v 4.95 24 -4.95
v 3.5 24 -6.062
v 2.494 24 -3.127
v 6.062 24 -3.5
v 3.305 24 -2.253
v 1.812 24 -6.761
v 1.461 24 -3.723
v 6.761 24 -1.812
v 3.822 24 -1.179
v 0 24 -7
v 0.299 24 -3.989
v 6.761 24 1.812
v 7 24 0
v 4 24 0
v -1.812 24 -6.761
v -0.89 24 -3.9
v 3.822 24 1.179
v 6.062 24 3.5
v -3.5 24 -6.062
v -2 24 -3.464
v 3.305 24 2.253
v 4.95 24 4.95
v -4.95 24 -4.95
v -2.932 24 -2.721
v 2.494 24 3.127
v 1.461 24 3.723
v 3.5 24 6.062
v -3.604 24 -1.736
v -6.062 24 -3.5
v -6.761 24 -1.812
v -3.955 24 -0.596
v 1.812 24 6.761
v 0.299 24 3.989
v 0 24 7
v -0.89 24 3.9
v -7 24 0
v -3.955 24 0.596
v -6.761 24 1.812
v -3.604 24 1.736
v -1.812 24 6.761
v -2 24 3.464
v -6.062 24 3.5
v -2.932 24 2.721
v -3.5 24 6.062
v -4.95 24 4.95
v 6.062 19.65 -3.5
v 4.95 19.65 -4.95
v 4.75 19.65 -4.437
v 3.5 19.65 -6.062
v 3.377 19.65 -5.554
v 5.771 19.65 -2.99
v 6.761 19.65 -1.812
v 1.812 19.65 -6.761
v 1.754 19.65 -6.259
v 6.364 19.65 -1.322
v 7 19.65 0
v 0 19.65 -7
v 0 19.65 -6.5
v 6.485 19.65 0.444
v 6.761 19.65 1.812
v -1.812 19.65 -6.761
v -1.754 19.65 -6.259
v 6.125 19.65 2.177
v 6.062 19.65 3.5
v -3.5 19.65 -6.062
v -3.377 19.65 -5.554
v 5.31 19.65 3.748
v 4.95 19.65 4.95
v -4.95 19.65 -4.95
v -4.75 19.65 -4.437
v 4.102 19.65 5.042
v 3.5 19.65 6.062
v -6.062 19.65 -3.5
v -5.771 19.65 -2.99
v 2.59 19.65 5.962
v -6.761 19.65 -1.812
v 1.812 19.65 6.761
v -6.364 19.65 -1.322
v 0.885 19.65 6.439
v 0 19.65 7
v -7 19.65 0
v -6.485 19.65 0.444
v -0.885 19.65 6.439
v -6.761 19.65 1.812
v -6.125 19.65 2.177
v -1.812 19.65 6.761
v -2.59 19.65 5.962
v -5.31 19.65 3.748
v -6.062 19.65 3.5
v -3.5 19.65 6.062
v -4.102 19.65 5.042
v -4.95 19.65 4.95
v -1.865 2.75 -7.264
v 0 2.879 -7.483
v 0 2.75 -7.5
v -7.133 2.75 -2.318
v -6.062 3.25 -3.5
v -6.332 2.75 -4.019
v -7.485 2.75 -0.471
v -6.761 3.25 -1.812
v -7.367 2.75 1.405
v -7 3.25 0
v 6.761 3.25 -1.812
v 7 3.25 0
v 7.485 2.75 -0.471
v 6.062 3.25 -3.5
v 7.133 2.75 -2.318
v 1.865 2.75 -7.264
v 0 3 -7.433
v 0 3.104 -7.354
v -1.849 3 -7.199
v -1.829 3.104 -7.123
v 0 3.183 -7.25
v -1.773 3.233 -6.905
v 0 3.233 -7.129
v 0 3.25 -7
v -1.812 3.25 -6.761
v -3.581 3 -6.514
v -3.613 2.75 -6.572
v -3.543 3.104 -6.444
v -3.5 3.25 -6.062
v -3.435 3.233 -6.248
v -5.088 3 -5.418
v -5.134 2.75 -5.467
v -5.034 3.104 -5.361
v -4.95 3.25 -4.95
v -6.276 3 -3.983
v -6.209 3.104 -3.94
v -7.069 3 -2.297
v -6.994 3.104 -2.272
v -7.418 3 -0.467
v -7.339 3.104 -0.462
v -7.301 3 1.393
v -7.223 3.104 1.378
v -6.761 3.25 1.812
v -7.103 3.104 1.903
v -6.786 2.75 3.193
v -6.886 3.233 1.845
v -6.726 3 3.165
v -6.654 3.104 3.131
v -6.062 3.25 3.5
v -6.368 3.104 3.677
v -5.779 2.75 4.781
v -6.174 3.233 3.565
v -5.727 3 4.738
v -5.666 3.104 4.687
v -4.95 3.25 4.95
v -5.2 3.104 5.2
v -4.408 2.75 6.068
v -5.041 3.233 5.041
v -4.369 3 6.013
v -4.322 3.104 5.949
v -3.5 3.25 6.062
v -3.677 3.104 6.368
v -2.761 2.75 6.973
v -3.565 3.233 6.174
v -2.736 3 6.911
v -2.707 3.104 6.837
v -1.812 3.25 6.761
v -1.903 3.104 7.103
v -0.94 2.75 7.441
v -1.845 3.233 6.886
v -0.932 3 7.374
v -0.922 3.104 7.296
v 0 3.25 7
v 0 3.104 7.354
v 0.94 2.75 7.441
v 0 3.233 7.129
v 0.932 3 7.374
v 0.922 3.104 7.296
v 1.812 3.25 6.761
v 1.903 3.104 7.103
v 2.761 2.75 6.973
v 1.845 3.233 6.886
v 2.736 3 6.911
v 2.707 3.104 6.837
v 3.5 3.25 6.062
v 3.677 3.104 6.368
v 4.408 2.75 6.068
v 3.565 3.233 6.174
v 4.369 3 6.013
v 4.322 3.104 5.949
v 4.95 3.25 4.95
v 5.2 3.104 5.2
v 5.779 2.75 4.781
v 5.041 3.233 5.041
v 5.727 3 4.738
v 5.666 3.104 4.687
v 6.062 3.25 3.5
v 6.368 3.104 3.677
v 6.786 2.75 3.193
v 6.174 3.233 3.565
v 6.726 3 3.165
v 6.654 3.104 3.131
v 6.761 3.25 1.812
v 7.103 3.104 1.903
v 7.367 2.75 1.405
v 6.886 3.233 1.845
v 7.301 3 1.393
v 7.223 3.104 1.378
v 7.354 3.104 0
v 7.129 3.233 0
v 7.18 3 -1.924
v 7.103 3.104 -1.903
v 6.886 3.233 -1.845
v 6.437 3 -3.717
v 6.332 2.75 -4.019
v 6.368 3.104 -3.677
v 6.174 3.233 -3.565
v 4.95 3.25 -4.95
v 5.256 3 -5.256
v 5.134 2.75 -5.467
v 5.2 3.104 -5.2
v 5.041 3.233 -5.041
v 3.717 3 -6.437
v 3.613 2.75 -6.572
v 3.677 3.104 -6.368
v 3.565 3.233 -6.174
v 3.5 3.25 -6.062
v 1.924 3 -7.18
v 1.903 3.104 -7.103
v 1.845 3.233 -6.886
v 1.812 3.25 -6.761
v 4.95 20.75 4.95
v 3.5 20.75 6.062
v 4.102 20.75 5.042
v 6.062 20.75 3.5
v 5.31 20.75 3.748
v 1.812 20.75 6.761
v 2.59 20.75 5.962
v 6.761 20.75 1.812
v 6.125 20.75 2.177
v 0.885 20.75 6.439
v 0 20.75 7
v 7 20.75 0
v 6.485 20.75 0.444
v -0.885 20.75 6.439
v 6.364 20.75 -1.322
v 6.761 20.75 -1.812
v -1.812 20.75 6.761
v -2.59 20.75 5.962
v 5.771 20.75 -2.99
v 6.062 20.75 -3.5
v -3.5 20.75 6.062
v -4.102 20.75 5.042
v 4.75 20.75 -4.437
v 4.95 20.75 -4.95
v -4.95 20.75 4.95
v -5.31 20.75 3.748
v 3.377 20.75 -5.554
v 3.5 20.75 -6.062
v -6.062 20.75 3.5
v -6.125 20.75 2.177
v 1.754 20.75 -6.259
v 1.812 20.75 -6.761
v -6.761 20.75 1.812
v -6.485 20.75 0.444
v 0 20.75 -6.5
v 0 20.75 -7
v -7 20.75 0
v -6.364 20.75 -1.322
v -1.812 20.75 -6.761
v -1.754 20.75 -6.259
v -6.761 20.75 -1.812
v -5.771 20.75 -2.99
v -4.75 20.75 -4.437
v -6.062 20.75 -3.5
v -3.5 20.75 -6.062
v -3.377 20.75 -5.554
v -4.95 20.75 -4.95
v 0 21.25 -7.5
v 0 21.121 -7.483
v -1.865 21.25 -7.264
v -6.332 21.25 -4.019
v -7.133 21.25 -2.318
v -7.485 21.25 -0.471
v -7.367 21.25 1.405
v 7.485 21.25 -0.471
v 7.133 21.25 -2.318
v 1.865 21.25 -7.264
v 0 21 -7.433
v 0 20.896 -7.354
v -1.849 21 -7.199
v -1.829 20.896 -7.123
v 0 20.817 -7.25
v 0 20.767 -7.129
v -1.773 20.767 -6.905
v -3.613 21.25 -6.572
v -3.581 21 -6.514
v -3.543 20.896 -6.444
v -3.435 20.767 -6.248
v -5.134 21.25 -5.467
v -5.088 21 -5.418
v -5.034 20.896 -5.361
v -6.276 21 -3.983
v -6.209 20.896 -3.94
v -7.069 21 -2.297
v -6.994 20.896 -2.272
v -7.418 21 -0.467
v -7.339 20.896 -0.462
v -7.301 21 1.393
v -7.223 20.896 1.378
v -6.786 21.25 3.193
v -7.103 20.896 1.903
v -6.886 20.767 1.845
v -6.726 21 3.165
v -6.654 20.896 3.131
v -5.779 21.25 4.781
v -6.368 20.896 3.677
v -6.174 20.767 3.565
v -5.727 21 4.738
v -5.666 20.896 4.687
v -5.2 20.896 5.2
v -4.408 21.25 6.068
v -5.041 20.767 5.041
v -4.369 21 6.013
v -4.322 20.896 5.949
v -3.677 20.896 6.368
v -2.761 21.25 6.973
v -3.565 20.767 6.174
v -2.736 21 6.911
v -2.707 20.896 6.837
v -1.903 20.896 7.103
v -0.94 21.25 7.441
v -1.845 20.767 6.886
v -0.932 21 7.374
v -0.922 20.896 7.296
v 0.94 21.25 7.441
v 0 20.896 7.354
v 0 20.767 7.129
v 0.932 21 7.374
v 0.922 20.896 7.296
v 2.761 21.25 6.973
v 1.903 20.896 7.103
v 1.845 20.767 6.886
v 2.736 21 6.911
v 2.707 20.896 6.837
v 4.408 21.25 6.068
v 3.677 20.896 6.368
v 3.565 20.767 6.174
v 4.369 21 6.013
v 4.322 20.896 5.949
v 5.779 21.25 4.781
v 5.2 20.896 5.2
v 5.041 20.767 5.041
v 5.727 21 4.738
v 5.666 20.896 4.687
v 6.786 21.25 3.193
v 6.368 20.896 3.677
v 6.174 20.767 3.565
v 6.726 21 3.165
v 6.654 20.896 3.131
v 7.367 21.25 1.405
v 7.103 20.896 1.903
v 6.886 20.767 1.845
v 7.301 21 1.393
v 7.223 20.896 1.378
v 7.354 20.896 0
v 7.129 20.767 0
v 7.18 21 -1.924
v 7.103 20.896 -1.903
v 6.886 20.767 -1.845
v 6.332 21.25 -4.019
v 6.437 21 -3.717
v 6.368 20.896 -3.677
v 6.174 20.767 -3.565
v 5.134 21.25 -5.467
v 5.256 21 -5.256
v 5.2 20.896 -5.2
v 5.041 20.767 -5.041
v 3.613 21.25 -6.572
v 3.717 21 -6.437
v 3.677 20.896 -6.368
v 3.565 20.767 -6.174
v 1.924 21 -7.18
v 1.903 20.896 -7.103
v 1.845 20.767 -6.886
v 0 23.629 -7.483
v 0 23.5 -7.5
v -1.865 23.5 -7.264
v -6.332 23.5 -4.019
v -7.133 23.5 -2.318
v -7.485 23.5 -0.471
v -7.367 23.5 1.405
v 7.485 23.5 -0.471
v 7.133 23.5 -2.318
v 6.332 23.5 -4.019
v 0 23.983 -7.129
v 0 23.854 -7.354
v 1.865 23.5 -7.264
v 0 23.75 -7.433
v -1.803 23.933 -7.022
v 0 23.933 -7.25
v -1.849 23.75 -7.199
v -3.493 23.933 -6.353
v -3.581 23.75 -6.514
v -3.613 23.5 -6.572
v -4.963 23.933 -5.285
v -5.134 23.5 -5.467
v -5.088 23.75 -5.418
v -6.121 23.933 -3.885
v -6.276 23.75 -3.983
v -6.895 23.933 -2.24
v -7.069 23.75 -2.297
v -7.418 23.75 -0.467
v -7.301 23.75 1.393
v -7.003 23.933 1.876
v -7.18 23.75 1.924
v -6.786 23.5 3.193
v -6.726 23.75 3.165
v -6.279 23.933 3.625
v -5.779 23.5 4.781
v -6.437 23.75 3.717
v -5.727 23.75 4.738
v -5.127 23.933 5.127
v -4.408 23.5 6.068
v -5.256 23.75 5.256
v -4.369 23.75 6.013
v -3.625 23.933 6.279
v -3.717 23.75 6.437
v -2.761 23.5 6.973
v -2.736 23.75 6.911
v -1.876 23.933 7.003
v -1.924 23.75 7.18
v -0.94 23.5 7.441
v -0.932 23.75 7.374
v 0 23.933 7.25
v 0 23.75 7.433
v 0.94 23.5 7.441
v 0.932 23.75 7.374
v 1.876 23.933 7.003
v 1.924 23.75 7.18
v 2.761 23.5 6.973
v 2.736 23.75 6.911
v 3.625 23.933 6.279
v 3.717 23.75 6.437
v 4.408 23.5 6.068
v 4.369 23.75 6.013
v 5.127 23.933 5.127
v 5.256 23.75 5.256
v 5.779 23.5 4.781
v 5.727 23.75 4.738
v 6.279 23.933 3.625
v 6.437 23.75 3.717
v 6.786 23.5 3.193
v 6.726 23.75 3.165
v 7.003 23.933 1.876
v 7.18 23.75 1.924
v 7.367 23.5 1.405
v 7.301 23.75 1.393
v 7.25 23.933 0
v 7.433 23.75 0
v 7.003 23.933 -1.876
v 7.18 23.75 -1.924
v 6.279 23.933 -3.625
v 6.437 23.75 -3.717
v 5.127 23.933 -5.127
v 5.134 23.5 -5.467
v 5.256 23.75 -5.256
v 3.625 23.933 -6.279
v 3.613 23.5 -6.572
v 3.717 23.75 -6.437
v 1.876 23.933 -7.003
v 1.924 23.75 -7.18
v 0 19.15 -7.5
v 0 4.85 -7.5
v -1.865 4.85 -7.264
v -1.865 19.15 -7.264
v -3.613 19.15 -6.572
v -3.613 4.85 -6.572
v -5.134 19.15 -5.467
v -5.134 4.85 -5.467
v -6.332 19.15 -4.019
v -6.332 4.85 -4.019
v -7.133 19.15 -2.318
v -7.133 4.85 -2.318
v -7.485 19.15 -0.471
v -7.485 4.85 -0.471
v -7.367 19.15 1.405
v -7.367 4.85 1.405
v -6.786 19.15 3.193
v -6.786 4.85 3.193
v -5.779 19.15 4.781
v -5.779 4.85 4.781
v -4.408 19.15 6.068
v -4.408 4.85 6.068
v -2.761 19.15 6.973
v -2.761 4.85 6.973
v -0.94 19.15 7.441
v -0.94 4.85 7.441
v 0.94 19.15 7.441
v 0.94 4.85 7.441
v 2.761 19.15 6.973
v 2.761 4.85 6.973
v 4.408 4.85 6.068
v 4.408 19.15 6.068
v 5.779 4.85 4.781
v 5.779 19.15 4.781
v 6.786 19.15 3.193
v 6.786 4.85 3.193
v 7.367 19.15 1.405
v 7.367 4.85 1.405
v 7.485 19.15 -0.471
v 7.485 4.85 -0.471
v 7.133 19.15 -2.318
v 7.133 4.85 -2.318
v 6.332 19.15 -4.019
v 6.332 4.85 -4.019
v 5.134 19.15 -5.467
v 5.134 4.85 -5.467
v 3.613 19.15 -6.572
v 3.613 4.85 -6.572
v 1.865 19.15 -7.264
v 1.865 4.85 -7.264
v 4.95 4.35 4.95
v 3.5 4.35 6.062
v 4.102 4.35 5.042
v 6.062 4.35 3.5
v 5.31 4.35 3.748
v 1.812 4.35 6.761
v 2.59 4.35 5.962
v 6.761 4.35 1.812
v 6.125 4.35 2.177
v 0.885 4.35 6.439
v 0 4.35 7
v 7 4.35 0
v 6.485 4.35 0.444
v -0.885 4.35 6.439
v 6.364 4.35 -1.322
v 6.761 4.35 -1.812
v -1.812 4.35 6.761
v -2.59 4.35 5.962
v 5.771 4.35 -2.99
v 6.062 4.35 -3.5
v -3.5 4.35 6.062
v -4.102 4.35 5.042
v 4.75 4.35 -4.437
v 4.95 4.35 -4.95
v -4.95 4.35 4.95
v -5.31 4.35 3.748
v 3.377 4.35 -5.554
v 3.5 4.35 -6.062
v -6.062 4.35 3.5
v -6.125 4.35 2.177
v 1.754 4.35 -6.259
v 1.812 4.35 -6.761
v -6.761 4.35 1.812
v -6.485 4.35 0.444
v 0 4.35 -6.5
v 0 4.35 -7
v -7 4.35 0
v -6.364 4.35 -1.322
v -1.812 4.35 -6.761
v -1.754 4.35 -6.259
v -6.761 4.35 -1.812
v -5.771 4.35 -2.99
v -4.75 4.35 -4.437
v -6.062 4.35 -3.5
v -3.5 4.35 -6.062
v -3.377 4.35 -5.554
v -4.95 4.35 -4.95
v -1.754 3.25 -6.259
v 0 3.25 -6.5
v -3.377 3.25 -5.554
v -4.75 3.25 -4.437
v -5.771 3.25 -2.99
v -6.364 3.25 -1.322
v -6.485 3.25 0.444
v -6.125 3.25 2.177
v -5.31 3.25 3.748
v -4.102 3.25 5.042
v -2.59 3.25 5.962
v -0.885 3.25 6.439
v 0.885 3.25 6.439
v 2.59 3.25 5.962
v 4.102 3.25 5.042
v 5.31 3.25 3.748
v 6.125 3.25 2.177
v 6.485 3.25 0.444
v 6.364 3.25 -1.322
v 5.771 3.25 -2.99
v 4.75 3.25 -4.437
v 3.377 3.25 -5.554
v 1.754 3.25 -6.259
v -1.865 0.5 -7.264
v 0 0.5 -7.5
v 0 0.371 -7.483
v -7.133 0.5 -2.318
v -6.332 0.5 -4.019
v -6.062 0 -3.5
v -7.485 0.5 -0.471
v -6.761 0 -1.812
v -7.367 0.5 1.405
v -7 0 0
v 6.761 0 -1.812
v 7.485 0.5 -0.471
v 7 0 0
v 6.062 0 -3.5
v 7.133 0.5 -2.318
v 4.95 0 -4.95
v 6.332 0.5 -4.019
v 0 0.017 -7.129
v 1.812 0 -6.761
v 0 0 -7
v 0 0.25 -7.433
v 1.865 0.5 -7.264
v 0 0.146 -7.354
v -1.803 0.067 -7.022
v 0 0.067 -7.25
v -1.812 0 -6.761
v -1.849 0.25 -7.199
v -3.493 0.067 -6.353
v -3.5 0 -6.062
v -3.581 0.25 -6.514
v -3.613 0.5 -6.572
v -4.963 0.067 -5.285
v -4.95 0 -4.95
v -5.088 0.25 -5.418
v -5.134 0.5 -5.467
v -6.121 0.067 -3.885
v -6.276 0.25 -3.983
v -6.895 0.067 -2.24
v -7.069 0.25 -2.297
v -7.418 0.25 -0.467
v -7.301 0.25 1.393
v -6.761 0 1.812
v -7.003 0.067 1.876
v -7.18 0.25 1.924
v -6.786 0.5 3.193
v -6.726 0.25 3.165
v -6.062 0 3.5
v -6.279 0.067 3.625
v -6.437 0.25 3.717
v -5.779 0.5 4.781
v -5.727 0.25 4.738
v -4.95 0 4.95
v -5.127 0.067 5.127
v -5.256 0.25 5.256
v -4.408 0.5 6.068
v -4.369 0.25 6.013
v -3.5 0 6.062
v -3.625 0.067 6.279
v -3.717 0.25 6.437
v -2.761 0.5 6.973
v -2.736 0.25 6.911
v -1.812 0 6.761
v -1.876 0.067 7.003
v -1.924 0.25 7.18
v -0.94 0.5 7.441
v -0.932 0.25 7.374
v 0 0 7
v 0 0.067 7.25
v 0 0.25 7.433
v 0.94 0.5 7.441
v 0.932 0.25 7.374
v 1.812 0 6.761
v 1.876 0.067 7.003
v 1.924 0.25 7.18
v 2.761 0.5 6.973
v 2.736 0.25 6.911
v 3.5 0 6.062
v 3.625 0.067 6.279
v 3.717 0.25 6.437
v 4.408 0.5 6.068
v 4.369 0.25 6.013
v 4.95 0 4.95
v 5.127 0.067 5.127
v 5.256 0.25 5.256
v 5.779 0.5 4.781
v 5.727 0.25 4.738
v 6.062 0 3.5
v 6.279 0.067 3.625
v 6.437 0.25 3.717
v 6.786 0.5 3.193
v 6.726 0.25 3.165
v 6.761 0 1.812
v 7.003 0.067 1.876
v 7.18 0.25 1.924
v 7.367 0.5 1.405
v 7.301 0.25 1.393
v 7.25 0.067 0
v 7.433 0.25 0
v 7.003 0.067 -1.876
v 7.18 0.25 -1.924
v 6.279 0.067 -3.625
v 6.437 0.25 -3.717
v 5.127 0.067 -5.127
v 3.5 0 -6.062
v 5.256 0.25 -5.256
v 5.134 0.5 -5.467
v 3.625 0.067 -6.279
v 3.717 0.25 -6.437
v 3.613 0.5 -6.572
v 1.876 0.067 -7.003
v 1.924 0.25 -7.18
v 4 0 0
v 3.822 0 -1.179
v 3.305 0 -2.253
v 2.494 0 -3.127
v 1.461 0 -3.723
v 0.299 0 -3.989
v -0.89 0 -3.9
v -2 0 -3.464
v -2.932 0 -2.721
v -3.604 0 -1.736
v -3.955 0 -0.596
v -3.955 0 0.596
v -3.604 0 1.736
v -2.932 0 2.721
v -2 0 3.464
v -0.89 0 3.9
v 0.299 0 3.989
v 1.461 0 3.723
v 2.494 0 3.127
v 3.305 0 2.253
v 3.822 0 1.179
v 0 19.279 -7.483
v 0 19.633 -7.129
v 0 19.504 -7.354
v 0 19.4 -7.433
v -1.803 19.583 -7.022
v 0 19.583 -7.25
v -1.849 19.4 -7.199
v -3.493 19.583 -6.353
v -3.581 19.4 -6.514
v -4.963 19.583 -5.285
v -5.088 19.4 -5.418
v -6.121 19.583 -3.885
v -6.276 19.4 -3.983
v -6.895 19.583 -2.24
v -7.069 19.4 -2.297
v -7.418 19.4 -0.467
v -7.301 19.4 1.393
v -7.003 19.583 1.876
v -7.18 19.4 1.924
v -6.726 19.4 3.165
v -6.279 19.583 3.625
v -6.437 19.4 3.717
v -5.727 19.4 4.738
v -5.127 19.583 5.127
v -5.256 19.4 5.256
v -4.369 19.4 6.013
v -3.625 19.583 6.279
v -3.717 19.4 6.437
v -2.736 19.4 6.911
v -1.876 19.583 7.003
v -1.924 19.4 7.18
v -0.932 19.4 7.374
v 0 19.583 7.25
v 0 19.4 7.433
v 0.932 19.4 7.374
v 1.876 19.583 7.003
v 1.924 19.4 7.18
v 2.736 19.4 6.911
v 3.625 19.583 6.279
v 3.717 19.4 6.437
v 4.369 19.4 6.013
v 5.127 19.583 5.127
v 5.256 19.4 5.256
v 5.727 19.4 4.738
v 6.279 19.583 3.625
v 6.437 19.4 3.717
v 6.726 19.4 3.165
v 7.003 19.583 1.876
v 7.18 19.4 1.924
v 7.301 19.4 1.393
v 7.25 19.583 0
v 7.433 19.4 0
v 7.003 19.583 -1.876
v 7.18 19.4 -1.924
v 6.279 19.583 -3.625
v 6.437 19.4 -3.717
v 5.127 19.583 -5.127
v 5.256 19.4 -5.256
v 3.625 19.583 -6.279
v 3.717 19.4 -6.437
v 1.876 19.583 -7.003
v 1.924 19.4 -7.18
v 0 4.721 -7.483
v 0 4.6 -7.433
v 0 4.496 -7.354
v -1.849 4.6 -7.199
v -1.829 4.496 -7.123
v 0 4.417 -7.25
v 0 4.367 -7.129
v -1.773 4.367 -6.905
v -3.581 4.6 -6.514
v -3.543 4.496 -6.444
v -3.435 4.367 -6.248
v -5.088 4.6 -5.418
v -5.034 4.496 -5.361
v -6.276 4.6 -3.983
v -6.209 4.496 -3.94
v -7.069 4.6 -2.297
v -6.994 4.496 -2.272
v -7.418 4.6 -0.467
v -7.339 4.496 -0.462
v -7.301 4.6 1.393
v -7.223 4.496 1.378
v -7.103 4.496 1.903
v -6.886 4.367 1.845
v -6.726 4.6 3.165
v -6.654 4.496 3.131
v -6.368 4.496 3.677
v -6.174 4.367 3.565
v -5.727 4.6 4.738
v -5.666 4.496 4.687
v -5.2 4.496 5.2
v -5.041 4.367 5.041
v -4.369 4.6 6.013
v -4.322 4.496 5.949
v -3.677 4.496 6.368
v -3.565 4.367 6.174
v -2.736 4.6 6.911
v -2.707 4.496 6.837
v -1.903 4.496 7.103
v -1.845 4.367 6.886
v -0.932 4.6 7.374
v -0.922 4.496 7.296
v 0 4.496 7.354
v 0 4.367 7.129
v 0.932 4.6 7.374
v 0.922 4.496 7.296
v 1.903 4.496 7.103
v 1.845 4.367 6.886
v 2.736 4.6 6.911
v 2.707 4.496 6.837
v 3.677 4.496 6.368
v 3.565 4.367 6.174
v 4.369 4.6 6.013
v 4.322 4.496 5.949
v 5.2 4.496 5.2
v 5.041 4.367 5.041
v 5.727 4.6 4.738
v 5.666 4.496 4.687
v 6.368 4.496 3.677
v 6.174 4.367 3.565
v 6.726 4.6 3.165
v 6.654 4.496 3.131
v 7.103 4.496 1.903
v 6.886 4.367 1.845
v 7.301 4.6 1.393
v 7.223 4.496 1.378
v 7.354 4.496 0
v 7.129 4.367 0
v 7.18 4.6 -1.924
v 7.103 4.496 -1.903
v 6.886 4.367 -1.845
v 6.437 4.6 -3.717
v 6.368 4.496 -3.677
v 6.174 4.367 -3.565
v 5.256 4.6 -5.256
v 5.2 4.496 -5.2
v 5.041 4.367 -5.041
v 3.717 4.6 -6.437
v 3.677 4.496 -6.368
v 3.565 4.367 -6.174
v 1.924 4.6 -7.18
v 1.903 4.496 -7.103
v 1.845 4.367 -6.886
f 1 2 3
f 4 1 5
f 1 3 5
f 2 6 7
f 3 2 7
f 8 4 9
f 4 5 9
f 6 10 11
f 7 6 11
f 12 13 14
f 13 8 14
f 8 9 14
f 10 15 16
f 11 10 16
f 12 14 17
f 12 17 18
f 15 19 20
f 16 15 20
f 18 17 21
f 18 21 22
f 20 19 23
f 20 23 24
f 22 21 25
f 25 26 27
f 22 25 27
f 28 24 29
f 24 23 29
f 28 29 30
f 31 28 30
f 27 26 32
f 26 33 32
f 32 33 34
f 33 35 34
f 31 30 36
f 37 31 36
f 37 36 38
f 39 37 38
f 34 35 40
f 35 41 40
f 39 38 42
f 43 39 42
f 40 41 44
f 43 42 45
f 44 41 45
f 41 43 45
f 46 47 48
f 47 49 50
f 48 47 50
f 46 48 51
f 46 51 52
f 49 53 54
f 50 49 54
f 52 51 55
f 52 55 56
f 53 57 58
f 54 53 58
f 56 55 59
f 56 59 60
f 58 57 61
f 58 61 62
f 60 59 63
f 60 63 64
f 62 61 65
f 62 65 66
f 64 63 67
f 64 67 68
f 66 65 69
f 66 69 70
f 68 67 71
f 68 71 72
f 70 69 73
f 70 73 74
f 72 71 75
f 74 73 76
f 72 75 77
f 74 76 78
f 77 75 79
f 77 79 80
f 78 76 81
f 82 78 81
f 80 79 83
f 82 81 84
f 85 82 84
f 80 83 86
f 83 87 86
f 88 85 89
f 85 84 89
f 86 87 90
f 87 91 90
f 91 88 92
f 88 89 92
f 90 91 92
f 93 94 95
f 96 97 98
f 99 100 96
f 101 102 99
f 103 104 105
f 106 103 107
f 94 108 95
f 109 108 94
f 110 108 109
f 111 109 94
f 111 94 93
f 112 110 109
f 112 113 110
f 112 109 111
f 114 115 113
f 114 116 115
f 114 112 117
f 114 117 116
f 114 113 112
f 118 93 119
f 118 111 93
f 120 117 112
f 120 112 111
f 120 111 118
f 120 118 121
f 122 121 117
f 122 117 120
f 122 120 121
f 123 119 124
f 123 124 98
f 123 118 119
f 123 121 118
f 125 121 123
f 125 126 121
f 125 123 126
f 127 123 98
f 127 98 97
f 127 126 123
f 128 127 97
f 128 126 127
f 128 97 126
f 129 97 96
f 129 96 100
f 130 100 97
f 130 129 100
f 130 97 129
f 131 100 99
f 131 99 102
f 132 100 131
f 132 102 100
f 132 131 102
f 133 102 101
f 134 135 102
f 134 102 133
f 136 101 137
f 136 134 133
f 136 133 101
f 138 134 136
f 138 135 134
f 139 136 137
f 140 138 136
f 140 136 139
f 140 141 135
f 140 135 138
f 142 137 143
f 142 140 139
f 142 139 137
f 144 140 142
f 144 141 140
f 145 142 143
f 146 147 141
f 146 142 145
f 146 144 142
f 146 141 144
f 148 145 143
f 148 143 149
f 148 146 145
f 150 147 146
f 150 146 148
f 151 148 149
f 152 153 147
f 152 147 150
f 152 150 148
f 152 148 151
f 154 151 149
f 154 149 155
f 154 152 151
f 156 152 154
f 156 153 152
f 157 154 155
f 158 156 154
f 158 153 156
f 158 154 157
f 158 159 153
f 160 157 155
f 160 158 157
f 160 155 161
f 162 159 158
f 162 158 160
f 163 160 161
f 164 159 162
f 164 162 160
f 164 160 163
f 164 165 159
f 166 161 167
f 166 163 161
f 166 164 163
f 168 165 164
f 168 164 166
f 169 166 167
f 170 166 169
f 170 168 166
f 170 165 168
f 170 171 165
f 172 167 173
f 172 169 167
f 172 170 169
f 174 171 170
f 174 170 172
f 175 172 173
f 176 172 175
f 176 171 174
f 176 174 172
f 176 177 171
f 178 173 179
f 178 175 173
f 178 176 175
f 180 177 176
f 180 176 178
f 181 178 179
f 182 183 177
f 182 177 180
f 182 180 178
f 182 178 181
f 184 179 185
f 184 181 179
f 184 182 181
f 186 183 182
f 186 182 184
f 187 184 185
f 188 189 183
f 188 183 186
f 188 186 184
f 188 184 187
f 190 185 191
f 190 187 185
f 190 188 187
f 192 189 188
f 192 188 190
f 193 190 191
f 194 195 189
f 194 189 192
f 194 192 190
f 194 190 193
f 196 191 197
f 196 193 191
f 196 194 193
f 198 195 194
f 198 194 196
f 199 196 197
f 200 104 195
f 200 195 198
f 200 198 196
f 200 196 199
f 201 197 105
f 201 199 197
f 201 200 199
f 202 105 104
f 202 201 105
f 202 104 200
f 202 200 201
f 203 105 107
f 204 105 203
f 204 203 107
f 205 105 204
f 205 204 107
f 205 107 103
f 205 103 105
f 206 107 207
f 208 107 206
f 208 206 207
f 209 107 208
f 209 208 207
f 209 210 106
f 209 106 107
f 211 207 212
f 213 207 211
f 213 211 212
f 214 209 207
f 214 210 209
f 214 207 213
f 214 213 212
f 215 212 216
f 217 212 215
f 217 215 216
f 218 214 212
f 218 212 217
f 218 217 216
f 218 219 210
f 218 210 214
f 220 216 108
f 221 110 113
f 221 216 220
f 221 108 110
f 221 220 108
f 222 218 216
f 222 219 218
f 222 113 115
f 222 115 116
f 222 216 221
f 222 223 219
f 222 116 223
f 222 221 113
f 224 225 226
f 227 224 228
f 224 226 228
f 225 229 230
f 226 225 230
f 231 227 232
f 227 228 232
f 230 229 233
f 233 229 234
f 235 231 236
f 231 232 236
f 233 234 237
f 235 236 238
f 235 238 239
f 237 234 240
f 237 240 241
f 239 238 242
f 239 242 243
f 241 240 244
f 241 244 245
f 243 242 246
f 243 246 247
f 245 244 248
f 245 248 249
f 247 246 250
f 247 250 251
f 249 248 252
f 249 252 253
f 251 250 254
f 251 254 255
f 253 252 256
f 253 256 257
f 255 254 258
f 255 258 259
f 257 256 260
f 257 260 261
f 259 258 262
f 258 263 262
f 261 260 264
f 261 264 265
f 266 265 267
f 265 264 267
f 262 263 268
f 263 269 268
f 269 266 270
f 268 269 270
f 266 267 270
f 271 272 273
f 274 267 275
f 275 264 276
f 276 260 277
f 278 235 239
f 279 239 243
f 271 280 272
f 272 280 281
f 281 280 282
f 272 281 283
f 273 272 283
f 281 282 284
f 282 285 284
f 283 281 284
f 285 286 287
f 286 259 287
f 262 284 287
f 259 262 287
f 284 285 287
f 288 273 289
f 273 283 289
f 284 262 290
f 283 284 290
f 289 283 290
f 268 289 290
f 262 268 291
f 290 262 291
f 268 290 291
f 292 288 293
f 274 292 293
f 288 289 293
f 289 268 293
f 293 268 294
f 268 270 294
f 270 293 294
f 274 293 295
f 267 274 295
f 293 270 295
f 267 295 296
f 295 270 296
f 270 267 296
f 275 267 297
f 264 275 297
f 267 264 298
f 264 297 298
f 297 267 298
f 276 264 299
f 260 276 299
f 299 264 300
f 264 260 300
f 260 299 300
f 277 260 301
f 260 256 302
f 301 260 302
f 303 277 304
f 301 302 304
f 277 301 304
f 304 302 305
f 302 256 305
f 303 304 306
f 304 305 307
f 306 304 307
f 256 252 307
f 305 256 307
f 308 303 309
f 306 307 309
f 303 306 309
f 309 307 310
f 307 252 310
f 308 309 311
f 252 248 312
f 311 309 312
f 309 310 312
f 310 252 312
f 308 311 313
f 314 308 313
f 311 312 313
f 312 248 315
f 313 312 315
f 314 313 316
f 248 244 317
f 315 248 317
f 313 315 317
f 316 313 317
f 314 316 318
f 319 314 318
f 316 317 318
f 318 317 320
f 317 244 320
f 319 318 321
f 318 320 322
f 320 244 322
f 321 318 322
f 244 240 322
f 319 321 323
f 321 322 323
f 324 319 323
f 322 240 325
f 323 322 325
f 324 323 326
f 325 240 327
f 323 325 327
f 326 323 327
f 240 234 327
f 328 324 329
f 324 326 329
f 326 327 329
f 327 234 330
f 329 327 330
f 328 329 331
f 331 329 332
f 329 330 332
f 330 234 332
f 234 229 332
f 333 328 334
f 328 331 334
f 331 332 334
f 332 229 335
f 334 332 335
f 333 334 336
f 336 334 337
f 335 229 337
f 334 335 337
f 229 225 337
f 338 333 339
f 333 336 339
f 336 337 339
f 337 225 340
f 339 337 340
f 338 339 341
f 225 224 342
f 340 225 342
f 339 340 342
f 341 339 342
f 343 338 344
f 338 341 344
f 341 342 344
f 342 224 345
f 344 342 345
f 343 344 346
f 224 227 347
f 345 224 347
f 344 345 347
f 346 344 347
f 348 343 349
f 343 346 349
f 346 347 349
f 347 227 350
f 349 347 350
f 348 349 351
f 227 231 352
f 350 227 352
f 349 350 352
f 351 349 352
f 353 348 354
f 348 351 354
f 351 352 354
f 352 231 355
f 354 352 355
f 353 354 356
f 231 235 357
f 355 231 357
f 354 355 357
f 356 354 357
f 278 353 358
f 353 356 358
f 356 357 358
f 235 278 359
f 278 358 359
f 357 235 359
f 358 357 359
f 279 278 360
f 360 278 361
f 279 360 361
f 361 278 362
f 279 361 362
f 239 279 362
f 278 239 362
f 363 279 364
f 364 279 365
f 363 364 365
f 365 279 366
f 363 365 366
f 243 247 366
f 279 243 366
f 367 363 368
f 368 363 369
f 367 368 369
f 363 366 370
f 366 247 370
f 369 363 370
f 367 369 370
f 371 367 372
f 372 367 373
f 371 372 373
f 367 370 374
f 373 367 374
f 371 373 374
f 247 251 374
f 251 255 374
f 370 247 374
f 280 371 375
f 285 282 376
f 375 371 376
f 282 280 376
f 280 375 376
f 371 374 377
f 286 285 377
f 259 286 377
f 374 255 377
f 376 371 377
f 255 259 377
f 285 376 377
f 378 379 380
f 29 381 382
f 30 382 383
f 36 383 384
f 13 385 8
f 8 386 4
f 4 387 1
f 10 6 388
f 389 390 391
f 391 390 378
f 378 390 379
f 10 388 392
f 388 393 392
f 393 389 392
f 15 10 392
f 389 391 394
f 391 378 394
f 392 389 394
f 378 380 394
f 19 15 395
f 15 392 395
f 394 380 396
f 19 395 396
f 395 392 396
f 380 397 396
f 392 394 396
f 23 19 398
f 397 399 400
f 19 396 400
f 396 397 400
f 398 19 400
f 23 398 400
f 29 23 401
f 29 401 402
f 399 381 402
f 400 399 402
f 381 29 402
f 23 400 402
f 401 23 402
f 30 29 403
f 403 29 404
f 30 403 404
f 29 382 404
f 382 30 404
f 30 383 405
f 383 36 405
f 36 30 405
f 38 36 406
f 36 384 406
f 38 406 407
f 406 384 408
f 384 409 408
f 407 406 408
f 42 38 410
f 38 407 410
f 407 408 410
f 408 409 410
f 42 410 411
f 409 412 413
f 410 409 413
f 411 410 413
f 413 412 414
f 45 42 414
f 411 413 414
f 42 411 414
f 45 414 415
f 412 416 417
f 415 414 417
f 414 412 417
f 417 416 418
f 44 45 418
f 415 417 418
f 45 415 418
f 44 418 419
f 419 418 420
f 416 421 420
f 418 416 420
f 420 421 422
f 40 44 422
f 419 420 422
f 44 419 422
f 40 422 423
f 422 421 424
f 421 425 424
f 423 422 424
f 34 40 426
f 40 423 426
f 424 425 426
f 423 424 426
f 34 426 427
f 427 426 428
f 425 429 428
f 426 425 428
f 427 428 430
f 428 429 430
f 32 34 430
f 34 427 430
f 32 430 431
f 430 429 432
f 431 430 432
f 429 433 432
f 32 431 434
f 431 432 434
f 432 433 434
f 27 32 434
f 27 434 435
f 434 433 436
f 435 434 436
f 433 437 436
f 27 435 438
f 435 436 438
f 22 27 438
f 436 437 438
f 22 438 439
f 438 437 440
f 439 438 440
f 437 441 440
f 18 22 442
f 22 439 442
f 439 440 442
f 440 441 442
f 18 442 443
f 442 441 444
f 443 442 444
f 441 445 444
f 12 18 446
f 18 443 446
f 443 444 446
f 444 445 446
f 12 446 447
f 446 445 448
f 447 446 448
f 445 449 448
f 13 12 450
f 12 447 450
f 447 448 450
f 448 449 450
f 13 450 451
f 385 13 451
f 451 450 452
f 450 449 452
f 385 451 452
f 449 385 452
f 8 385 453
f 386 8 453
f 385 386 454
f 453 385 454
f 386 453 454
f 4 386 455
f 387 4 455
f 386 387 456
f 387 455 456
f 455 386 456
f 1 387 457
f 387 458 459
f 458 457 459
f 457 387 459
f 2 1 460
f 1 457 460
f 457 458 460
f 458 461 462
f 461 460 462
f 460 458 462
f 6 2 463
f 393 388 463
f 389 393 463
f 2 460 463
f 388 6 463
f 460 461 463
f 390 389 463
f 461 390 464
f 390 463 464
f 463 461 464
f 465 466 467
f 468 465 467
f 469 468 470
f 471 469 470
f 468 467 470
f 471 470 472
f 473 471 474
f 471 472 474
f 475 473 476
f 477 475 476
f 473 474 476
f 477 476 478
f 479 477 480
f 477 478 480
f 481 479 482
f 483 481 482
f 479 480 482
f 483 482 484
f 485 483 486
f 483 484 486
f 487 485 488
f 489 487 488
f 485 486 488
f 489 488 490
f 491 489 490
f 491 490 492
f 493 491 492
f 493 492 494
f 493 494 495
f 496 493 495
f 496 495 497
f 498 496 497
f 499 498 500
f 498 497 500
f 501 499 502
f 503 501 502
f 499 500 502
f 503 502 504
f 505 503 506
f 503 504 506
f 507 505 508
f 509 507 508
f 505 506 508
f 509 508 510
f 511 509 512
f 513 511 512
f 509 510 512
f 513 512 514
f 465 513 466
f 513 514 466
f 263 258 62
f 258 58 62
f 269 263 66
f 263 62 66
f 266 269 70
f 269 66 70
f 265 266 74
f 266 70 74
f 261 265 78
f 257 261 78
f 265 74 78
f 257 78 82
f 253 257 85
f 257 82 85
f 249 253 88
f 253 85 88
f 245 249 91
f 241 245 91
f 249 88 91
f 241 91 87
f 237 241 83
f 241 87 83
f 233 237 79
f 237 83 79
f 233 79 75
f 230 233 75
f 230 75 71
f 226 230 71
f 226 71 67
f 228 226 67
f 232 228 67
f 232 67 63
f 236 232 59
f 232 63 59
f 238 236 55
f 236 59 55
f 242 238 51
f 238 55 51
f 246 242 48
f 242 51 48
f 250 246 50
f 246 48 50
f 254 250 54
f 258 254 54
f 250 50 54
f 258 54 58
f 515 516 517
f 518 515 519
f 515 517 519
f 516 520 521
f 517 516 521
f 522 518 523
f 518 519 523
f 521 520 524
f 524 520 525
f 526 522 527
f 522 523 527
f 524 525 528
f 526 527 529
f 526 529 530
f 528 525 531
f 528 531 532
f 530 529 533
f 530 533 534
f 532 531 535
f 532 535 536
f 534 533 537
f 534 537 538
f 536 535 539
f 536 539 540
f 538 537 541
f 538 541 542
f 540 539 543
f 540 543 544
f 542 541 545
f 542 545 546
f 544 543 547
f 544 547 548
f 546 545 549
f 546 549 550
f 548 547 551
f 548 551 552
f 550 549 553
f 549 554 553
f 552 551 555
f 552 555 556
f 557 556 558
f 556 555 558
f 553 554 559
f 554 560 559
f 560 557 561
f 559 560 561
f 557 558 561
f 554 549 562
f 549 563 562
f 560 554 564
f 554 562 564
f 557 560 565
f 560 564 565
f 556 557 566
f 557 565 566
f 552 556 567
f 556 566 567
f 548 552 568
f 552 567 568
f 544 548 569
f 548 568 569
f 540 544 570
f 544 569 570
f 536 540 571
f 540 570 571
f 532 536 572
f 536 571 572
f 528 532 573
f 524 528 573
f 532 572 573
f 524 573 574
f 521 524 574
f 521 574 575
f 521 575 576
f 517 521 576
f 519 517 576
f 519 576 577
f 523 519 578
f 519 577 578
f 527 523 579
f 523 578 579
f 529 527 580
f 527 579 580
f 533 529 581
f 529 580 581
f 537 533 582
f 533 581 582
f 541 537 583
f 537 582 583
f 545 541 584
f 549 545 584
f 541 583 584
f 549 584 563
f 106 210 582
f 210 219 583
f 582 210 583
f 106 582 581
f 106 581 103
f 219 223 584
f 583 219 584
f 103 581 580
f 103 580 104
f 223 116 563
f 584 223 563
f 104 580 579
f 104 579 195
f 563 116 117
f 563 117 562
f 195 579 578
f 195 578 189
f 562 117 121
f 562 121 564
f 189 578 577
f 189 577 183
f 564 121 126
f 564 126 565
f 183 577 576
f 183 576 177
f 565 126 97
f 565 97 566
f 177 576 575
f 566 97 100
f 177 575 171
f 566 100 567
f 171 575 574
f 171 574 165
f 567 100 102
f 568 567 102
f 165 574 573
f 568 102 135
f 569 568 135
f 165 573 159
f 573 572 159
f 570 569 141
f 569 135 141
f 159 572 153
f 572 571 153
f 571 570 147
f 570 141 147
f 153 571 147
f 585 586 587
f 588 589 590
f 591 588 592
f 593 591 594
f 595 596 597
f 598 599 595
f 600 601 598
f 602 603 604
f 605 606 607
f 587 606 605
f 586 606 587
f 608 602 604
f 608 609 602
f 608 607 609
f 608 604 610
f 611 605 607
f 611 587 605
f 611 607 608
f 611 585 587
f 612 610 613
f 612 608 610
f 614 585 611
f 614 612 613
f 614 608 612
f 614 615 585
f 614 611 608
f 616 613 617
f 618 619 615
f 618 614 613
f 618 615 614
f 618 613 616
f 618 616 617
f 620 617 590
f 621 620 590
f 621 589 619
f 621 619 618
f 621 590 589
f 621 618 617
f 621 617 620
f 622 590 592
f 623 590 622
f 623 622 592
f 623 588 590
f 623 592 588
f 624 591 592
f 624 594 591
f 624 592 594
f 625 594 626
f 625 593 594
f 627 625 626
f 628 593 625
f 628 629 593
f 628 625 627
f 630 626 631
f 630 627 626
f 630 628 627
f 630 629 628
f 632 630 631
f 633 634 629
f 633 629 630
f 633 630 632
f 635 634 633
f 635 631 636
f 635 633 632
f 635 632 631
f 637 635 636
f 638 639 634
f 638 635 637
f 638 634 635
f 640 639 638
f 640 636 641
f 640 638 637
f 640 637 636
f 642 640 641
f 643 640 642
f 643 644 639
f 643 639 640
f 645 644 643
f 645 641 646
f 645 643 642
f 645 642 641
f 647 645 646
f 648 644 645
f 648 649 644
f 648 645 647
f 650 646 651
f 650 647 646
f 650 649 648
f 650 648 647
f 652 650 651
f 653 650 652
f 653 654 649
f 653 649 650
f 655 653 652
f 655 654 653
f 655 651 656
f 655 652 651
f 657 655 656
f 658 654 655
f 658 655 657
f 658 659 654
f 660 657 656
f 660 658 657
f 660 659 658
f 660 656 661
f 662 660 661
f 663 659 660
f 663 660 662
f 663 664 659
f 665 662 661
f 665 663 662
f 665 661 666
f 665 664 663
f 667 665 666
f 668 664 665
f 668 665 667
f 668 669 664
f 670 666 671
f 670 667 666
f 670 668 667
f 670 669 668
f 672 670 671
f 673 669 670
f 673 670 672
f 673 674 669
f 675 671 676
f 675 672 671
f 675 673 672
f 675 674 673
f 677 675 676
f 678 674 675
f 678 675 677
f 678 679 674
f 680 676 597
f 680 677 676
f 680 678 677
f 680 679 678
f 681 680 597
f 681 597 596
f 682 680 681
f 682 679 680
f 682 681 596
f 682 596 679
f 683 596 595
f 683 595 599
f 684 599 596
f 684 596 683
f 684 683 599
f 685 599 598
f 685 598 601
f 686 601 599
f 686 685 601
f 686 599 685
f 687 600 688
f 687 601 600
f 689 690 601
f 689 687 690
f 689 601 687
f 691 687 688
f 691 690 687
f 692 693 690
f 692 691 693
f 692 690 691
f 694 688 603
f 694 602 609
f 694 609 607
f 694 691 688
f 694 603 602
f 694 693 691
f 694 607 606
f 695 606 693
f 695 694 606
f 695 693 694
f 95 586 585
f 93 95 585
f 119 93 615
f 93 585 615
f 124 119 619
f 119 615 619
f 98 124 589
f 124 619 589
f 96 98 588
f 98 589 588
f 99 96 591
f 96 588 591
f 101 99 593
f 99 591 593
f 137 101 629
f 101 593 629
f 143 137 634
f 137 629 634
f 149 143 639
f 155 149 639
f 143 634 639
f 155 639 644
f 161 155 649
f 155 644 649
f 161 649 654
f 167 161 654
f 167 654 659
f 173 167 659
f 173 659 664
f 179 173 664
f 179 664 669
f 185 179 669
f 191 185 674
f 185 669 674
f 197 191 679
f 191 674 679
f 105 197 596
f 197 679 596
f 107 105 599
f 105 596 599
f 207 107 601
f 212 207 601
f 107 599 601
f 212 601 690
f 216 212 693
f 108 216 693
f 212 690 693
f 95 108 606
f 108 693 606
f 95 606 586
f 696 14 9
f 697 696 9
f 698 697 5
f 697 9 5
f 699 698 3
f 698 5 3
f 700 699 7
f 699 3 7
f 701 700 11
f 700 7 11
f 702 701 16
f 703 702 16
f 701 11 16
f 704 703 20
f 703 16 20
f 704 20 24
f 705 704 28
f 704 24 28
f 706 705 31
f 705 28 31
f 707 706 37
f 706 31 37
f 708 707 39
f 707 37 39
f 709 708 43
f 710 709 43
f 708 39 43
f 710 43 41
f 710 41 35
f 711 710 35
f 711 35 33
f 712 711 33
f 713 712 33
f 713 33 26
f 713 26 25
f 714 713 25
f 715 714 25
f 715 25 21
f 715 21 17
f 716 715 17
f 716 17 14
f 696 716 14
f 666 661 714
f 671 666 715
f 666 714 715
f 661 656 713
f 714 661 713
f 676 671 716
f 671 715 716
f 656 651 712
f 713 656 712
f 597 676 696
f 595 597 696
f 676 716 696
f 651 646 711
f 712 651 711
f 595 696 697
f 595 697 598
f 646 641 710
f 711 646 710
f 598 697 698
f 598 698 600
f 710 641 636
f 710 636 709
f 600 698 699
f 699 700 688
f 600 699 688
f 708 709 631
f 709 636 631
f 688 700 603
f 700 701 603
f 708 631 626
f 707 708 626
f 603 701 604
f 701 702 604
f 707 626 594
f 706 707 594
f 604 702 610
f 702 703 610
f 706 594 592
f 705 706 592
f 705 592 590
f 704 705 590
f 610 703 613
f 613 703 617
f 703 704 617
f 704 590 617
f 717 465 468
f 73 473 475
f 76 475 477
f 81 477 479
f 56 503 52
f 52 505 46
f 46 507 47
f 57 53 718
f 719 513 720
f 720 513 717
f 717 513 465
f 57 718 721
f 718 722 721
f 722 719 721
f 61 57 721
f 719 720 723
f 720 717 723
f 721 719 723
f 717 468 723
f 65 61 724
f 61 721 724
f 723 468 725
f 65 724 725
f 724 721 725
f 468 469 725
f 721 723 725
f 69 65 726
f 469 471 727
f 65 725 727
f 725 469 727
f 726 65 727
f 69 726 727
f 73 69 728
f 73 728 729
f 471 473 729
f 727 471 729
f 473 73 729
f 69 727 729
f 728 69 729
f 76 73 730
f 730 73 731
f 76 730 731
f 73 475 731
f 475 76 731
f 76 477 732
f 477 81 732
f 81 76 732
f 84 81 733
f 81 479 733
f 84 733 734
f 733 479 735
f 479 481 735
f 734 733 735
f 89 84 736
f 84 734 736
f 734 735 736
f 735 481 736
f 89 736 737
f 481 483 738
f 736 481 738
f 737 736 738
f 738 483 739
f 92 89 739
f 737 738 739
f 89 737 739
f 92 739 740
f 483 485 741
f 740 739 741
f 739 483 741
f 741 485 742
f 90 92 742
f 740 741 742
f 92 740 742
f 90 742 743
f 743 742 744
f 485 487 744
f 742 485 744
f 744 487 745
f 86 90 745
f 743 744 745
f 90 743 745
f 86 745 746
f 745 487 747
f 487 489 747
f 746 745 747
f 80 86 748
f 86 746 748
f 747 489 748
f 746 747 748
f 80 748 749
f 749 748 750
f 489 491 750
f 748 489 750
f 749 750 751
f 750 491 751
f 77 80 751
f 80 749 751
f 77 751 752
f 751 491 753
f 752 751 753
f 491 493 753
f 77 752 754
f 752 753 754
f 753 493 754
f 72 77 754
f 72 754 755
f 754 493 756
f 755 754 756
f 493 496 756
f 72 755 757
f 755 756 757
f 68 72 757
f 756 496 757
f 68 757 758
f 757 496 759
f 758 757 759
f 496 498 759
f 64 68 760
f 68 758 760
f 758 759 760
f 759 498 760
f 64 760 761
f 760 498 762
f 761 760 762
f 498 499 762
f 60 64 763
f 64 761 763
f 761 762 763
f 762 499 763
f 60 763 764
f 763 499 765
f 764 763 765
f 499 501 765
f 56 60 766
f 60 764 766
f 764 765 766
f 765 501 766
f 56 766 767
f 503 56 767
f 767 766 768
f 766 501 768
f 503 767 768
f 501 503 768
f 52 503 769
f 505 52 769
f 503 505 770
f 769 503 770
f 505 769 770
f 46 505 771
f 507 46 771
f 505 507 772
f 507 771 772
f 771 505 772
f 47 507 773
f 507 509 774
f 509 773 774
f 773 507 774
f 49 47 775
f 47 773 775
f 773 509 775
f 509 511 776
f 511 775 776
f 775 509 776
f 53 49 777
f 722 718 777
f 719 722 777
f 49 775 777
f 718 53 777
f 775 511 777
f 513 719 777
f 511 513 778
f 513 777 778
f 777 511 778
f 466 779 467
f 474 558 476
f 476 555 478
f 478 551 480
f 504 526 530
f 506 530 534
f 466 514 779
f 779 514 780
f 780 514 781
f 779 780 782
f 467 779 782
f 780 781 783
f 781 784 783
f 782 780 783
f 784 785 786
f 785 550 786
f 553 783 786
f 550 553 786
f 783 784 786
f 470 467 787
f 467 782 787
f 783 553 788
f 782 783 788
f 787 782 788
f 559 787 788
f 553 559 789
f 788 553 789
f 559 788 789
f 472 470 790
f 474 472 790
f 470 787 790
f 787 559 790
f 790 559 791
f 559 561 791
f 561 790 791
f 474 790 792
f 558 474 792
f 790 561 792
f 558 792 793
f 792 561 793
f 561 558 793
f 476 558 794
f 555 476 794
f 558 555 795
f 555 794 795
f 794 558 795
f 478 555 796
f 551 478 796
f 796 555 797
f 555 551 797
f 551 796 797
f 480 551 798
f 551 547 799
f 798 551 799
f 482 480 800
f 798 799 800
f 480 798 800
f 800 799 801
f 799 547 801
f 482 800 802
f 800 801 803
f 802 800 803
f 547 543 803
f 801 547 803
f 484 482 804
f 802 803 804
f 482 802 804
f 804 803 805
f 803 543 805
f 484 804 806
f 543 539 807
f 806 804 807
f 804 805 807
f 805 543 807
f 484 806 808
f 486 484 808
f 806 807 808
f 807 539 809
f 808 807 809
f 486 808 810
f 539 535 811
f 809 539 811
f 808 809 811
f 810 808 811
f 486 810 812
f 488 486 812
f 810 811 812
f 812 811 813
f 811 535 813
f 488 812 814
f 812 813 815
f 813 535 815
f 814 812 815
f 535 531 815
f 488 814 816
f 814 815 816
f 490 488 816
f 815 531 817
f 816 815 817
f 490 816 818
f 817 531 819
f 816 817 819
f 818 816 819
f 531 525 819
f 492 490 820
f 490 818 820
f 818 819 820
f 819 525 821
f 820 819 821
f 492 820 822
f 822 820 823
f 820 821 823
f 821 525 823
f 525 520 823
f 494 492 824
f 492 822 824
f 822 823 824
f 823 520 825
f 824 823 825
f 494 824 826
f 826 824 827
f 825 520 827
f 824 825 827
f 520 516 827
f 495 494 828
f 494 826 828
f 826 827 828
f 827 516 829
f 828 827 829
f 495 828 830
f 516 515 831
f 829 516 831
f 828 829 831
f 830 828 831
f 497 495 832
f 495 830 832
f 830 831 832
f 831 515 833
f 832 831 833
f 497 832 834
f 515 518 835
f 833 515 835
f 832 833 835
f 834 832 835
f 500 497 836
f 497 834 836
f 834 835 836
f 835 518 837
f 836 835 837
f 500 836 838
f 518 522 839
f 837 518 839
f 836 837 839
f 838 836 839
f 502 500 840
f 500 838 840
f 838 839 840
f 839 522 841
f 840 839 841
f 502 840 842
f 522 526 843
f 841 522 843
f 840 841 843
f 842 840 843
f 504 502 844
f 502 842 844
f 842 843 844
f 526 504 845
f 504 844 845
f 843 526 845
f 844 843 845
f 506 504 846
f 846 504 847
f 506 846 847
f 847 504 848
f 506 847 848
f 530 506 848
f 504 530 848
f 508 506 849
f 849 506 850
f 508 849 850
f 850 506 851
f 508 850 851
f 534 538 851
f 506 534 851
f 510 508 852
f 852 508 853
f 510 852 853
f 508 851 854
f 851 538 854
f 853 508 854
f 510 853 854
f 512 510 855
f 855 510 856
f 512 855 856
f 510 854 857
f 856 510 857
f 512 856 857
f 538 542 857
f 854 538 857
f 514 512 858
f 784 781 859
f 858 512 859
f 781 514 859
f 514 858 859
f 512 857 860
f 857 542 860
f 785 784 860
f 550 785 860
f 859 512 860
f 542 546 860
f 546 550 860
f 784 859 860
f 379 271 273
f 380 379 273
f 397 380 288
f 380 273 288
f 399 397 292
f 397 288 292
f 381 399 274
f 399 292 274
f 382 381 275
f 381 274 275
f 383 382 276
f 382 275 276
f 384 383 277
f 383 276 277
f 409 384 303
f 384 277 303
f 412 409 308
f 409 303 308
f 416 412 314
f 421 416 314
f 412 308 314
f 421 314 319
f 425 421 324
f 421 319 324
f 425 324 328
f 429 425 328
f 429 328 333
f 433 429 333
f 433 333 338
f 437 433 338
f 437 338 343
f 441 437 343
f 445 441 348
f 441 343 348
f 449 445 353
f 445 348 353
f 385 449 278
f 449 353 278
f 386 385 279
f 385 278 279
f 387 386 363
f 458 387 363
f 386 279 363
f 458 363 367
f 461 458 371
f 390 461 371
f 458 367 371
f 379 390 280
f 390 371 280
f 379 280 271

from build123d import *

# Parameters (mm, degrees)
CUT_EXTRUDE2_REACH = 26
SKETCH5_R          = 4
FILLET1_R          = 0.5
FILLET2_R          = 0.5


with BuildPart() as part:
    # Sketch1 → Revolve1 (revolve)
    with BuildSketch(Plane(origin=(0, 0, 0), x_dir=(0, 0, -1), z_dir=(1, 0, 0))):
        Polygon((0, 0), (0, 24), (7.5, 24), (7.5, 20.75), (6.5, 20.75), (6.5, 19.65), (7.5, 19.65), (7.5, 4.35), (6.5, 4.35), (6.5, 3.25), (7.5, 3.25), (7.5, 0), align=None)
    revolve(axis=Axis((0, 0, 0), (0, 1, 0)))

    # Sketch5 → Cut-Extrude2 (cut, up to next)
    with BuildSketch(Plane(origin=(0, 24, 0), x_dir=(1, 0, 0), z_dir=(0, 1, 0)), mode=Mode.PRIVATE) as cut_extrude2_sk1:
        Circle(SKETCH5_R)
    cut_extrude2_tool1 = extrude(cut_extrude2_sk1.sketch, amount=-CUT_EXTRUDE2_REACH, mode=Mode.PRIVATE) & part.part
    add(cut_extrude2_tool1.solids().sort_by_distance((0, 24, 0))[0], mode=Mode.SUBTRACT)

    # Fillet1
    fillet1_edges = [part.edges().sort_by_distance(p)[0] for p in [
        (0, 24, 7.5),
        (0, 0, 7.5),
    ]]
    fillet(fillet1_edges, radius=FILLET1_R)

    # Fillet2
    fillet2_edges = [part.edges().sort_by_distance(p)[0] for p in [
        (0, 4.35, 7.5),
        (0, 19.65, 7.5),
        (0, 20.75, 7.5),
        (0, 3.25, 7.5),
    ]]
    fillet(fillet2_edges, radius=FILLET2_R)


solid = part.part
